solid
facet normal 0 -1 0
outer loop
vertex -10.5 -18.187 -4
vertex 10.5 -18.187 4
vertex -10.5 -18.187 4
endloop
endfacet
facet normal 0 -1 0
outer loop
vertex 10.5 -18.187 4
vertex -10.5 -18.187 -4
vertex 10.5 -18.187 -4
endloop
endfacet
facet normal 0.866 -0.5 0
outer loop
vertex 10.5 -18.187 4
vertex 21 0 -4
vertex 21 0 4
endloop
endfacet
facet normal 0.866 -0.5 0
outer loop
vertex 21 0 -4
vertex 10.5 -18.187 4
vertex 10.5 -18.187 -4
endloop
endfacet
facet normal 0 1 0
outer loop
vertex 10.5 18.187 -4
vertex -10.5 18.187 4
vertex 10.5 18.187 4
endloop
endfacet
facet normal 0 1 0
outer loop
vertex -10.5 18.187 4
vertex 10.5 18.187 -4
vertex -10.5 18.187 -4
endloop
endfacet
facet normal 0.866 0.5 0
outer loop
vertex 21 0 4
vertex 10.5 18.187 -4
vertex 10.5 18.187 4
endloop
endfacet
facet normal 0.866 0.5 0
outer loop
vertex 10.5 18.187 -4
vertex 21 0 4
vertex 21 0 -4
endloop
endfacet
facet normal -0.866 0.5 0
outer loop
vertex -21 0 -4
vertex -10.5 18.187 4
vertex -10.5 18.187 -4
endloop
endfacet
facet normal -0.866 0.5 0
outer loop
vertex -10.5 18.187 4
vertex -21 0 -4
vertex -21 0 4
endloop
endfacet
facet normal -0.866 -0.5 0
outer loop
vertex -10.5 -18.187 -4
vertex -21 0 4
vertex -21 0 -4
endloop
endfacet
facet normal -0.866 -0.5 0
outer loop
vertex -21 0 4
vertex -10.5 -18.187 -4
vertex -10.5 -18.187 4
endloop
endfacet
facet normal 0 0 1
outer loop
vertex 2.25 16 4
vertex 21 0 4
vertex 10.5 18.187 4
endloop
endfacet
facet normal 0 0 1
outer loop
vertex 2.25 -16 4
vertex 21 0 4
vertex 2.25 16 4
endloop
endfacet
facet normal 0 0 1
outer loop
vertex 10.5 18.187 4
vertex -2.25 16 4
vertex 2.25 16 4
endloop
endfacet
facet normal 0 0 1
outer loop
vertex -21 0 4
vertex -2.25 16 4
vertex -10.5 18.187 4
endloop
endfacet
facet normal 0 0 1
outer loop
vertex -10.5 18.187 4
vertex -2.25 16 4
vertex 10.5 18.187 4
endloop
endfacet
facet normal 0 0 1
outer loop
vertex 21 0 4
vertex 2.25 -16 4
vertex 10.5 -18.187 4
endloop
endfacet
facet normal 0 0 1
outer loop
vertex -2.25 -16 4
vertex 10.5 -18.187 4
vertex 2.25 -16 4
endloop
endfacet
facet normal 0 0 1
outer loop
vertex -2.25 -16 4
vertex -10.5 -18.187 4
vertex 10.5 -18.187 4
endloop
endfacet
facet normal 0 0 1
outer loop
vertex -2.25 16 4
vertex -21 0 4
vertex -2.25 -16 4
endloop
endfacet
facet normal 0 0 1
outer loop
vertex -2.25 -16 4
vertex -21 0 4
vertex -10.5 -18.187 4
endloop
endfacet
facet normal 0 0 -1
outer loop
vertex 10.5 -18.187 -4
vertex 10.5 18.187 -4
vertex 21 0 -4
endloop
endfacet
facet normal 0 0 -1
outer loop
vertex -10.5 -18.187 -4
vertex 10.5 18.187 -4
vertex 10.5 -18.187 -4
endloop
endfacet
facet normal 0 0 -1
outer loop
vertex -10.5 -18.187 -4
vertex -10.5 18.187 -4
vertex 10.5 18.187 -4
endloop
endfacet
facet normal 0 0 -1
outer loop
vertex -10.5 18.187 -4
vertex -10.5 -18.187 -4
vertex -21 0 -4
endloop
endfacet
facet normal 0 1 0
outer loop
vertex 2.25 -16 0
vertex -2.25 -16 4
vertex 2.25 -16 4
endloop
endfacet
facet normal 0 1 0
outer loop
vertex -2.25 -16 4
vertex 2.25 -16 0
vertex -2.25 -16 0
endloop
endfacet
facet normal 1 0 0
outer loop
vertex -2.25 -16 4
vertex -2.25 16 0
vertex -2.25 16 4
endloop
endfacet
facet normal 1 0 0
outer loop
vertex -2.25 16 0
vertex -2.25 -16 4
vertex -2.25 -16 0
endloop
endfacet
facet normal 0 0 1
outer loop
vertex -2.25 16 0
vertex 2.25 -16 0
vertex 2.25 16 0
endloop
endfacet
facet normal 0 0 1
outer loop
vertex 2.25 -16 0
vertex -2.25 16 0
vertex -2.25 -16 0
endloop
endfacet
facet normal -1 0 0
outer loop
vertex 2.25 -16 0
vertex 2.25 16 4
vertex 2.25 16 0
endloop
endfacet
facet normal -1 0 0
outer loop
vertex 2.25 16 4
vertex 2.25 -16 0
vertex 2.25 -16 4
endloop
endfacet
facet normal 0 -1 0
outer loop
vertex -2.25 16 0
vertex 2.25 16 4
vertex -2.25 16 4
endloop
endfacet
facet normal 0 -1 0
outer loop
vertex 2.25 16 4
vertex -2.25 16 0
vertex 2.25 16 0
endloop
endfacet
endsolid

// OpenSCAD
difference() {
	translate(v = [0, 0, 0]) {
		rotate(a = [0, 0, 0]) {
			cylinder($fn = 6, center = true, h = 8, r1 = 21, r2 = 21);
		}
	}
	translate(v = [0, 0, 4.0000000000]) {
		rotate(a = [0, 0, 90]) {
			cube(center = true, size = [32.0000000000, 4.5000000000, 8]);
		}
	}
}
/***********************************************
*********      SolidPython code:      **********
************************************************
 
__author__ = 'Mark Weinreuter'

from config import *

cut = C(mirror_slit_width +.5, mirror_thickness+.5, block_base_h_mm)
cut.rz = 90
cut.z = block_base_h_mm / 2
base = make_base()

mir_tile1 = base - cut
cut.rz = 60
mir_tile2 = base - cut

scad_render_to_file(mir_tile1, "scad/mirror_tile1.scad")
scad_render_to_file(mir_tile2, "scad/mirror_tile2.scad")

# holes_rots = (60, 60 + 180, 60 + 90, (60 + 90 + 180))
# holes = []
# for rot in holes_rots:
#    holes.append(
#        up(block_base_h_mm / 2)(rotate([0, 0, rot])(left(connector_dist_mm)(cylinder(connector_r_mm, h=block_base_h_mm, center=True, segments=256)))))


cable_hole = cylinder(cable_r_mm, h=block_base_h_mm * 10, center=True)
# base -= cable_hole
# for h in holes:
#    base -= h

turret_w = 30
turret_height = 50
turret_th = 10
t = cube([turret_w, turret_w, turret_height], center=True)
t_cutout = cube([turret_w - 2 * turret_th, turret_w, turret_height], center=True)
t -= translate([0, turret_th, -turret_th])(t_cutout)

scad_render_to_file(t, "scad/block_turret.scad")
 
 
************************************************/
